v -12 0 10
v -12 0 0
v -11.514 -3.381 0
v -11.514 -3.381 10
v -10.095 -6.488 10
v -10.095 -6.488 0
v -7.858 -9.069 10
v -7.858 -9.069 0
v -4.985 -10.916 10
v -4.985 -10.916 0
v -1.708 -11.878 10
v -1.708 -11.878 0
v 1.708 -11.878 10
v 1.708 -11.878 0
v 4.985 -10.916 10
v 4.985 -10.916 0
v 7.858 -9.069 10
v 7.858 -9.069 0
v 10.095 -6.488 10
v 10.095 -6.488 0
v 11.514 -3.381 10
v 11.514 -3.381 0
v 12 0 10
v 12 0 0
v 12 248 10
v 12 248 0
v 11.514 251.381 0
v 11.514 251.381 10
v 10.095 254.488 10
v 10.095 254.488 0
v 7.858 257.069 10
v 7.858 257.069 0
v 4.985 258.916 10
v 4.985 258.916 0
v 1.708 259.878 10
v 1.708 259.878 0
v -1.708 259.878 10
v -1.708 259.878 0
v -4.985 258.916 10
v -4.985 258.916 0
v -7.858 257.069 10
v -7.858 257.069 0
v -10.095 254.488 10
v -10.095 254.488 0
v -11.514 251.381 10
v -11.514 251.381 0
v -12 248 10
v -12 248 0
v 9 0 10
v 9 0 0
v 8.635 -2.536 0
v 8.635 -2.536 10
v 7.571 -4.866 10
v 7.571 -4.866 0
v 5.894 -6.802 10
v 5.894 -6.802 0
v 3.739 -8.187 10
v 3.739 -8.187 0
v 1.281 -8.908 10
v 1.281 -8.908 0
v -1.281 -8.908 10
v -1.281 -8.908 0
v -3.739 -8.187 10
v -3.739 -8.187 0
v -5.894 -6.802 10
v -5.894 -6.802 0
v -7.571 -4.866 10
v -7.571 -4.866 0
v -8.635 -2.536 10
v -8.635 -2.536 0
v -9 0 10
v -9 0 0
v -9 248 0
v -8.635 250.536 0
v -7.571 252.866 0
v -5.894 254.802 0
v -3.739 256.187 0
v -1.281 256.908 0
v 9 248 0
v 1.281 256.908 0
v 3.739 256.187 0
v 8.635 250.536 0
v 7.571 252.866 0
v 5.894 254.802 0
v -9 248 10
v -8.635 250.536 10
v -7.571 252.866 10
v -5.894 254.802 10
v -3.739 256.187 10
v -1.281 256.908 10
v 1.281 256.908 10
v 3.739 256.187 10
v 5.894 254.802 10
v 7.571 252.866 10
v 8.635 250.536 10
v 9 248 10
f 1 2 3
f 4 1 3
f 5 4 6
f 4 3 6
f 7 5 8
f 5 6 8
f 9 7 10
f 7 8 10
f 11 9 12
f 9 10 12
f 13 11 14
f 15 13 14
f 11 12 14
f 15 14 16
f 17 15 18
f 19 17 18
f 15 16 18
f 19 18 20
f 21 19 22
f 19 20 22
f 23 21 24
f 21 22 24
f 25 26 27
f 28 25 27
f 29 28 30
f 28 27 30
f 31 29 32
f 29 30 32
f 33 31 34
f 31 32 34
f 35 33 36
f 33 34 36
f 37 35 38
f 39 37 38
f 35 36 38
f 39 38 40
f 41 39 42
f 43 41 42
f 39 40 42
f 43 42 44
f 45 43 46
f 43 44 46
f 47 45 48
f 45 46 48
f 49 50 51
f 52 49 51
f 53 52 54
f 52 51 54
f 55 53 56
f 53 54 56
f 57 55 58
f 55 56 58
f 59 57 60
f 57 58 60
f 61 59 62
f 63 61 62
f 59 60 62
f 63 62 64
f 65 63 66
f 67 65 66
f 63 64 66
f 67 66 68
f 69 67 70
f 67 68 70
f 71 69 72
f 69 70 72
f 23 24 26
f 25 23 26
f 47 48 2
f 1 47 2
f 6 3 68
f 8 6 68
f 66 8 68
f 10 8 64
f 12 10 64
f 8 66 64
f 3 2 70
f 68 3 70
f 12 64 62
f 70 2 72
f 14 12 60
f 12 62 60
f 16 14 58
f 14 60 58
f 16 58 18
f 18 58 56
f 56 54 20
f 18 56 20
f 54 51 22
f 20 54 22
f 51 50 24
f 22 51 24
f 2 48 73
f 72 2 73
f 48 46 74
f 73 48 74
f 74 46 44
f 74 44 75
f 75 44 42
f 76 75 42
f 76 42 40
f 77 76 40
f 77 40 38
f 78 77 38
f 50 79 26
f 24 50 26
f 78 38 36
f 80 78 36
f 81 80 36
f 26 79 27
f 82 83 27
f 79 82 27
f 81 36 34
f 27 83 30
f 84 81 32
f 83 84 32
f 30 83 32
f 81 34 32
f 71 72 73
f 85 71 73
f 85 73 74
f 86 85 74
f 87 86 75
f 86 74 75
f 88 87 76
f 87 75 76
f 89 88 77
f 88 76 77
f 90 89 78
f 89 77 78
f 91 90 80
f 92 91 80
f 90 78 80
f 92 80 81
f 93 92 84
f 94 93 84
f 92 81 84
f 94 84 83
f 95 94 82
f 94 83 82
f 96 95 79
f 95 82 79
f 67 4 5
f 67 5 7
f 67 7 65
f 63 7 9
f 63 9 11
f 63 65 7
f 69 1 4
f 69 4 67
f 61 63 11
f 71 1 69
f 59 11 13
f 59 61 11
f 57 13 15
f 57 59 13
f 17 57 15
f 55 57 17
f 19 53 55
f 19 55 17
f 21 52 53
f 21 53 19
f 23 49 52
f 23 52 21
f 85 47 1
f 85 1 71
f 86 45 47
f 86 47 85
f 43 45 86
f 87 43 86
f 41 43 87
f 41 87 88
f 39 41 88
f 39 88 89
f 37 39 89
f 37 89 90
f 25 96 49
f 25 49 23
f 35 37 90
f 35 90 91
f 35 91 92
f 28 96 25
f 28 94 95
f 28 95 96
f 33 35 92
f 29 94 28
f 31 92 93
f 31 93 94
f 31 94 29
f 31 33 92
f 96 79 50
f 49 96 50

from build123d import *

# Parameters (mm, degrees)
EXTRUDE_1_DEPTH = 10


with BuildPart() as part:
    # 草图1 → 凸台-拉伸1 (new body)
    with BuildSketch(Plane.XY):
        with BuildLine():
            ThreePointArc((-12, 248), (-11.22497216, 243.757359313), (-9, 240.062746067))
            Line((-9, 240.062746067), (-9, 248))
            ThreePointArc((-9, 248), (0, 257), (9, 248))
            Line((9, 248), (9, 240.062746067))
            ThreePointArc((9, 240.062746067), (11.22497216, 243.757359313), (12, 248))
            ThreePointArc((12, 248), (0, 260), (-12, 248))
        make_face()
        with BuildLine():
            ThreePointArc((-12, 0), (-11.22497216, 4.242640687), (-9, 7.937253933))
            Line((-9, 7.937253933), (-9, 240.062746067))
            ThreePointArc((-9, 240.062746067), (-11.22497216, 243.757359313), (-12, 248))
            Line((-12, 248), (-12, 0))
        make_face()
        with BuildLine():
            Line((9, 240.062746067), (9, 7.937253933))
            ThreePointArc((9, 7.937253933), (11.22497216, 4.242640687), (12, 0))
            Line((12, 0), (12, 248))
            ThreePointArc((12, 248), (11.22497216, 243.757359313), (9, 240.062746067))
        make_face()
        with BuildLine():
            Line((9, 7.937253933), (9, 0))
            ThreePointArc((9, 0), (0, -9), (-9, 0))
            Line((-9, 0), (-9, 7.937253933))
            ThreePointArc((-9, 7.937253933), (-11.22497216, 4.242640687), (-12, 0))
            ThreePointArc((-12, 0), (0, -12), (12, 0))
            ThreePointArc((12, 0), (11.22497216, 4.242640687), (9, 7.937253933))
        make_face()
    extrude(amount=EXTRUDE_1_DEPTH)


solid = part.part
